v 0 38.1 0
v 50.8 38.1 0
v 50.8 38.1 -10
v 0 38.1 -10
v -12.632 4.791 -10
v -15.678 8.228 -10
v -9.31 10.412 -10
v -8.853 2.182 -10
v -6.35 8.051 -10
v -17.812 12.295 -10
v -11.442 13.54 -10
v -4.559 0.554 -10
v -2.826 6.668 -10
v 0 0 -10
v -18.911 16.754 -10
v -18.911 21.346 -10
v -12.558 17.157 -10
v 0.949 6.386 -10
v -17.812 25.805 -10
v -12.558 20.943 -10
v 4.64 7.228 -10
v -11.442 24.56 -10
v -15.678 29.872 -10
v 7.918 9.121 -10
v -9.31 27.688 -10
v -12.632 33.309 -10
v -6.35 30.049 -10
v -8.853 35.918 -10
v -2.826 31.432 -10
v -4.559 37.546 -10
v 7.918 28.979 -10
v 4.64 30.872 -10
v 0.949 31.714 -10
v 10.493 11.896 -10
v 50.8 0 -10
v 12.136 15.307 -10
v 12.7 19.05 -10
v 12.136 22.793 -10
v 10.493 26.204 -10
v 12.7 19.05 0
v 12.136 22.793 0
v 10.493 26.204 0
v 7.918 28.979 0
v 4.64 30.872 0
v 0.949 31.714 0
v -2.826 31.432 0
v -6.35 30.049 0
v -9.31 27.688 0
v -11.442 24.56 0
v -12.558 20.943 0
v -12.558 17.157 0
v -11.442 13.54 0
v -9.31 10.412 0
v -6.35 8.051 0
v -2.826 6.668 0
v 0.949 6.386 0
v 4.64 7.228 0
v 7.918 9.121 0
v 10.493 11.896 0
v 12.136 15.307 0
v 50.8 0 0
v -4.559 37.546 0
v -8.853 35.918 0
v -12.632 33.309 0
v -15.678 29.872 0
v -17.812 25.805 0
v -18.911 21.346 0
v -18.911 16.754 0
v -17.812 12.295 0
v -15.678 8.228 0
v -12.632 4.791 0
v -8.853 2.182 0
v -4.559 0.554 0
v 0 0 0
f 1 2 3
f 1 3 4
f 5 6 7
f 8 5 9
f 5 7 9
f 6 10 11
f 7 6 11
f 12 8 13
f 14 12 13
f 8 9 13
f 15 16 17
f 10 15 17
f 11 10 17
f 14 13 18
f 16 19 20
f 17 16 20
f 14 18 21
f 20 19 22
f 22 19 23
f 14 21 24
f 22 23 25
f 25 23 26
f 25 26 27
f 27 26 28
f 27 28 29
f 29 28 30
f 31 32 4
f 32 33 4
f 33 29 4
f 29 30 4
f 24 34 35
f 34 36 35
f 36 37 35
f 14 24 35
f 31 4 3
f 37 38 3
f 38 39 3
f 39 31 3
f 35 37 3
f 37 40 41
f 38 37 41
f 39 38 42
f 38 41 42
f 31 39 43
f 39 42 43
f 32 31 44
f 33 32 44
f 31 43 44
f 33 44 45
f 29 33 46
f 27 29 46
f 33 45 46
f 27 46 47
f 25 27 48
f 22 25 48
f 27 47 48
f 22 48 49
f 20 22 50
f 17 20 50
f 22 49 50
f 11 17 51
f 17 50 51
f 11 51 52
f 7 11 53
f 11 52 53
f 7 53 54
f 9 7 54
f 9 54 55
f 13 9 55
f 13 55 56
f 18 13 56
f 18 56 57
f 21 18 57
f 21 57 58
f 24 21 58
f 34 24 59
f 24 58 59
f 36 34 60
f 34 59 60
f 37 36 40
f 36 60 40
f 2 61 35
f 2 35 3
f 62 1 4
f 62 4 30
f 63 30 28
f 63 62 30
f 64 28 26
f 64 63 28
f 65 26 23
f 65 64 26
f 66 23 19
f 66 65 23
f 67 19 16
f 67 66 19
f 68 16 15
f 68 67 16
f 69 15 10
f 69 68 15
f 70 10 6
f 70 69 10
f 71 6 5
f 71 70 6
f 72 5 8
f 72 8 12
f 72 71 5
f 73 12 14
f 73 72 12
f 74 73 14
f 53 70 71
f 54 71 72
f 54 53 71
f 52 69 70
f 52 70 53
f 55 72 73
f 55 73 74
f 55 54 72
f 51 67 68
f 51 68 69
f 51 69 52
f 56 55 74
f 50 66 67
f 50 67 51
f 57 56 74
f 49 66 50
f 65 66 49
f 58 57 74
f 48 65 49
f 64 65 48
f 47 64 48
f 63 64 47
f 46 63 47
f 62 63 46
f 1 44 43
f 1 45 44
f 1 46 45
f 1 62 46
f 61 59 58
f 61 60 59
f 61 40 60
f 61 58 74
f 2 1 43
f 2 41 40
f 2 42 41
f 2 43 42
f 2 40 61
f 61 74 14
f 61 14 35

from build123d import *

# Parameters (mm, degrees)
SKETCH1_R      = 12.7
EXTRUDE1_DEPTH = 10.000000066


with BuildPart() as part:
    # Sketch1 → Extrude1 (new body)
    with BuildSketch(Plane.XY):
        with BuildLine():
            Line((0, 0), (50.8, 0))
            Line((50.8, 0), (50.8, 38.1))
            Line((50.8, 38.1), (0, 38.1))
            ThreePointArc((0, 38.1), (-19.05, 19.05), (0, 0))
        make_face()
        with Locations((0, 19.05)):
            Circle(SKETCH1_R, mode=Mode.SUBTRACT)
    extrude(amount=-EXTRUDE1_DEPTH)


solid = part.part
